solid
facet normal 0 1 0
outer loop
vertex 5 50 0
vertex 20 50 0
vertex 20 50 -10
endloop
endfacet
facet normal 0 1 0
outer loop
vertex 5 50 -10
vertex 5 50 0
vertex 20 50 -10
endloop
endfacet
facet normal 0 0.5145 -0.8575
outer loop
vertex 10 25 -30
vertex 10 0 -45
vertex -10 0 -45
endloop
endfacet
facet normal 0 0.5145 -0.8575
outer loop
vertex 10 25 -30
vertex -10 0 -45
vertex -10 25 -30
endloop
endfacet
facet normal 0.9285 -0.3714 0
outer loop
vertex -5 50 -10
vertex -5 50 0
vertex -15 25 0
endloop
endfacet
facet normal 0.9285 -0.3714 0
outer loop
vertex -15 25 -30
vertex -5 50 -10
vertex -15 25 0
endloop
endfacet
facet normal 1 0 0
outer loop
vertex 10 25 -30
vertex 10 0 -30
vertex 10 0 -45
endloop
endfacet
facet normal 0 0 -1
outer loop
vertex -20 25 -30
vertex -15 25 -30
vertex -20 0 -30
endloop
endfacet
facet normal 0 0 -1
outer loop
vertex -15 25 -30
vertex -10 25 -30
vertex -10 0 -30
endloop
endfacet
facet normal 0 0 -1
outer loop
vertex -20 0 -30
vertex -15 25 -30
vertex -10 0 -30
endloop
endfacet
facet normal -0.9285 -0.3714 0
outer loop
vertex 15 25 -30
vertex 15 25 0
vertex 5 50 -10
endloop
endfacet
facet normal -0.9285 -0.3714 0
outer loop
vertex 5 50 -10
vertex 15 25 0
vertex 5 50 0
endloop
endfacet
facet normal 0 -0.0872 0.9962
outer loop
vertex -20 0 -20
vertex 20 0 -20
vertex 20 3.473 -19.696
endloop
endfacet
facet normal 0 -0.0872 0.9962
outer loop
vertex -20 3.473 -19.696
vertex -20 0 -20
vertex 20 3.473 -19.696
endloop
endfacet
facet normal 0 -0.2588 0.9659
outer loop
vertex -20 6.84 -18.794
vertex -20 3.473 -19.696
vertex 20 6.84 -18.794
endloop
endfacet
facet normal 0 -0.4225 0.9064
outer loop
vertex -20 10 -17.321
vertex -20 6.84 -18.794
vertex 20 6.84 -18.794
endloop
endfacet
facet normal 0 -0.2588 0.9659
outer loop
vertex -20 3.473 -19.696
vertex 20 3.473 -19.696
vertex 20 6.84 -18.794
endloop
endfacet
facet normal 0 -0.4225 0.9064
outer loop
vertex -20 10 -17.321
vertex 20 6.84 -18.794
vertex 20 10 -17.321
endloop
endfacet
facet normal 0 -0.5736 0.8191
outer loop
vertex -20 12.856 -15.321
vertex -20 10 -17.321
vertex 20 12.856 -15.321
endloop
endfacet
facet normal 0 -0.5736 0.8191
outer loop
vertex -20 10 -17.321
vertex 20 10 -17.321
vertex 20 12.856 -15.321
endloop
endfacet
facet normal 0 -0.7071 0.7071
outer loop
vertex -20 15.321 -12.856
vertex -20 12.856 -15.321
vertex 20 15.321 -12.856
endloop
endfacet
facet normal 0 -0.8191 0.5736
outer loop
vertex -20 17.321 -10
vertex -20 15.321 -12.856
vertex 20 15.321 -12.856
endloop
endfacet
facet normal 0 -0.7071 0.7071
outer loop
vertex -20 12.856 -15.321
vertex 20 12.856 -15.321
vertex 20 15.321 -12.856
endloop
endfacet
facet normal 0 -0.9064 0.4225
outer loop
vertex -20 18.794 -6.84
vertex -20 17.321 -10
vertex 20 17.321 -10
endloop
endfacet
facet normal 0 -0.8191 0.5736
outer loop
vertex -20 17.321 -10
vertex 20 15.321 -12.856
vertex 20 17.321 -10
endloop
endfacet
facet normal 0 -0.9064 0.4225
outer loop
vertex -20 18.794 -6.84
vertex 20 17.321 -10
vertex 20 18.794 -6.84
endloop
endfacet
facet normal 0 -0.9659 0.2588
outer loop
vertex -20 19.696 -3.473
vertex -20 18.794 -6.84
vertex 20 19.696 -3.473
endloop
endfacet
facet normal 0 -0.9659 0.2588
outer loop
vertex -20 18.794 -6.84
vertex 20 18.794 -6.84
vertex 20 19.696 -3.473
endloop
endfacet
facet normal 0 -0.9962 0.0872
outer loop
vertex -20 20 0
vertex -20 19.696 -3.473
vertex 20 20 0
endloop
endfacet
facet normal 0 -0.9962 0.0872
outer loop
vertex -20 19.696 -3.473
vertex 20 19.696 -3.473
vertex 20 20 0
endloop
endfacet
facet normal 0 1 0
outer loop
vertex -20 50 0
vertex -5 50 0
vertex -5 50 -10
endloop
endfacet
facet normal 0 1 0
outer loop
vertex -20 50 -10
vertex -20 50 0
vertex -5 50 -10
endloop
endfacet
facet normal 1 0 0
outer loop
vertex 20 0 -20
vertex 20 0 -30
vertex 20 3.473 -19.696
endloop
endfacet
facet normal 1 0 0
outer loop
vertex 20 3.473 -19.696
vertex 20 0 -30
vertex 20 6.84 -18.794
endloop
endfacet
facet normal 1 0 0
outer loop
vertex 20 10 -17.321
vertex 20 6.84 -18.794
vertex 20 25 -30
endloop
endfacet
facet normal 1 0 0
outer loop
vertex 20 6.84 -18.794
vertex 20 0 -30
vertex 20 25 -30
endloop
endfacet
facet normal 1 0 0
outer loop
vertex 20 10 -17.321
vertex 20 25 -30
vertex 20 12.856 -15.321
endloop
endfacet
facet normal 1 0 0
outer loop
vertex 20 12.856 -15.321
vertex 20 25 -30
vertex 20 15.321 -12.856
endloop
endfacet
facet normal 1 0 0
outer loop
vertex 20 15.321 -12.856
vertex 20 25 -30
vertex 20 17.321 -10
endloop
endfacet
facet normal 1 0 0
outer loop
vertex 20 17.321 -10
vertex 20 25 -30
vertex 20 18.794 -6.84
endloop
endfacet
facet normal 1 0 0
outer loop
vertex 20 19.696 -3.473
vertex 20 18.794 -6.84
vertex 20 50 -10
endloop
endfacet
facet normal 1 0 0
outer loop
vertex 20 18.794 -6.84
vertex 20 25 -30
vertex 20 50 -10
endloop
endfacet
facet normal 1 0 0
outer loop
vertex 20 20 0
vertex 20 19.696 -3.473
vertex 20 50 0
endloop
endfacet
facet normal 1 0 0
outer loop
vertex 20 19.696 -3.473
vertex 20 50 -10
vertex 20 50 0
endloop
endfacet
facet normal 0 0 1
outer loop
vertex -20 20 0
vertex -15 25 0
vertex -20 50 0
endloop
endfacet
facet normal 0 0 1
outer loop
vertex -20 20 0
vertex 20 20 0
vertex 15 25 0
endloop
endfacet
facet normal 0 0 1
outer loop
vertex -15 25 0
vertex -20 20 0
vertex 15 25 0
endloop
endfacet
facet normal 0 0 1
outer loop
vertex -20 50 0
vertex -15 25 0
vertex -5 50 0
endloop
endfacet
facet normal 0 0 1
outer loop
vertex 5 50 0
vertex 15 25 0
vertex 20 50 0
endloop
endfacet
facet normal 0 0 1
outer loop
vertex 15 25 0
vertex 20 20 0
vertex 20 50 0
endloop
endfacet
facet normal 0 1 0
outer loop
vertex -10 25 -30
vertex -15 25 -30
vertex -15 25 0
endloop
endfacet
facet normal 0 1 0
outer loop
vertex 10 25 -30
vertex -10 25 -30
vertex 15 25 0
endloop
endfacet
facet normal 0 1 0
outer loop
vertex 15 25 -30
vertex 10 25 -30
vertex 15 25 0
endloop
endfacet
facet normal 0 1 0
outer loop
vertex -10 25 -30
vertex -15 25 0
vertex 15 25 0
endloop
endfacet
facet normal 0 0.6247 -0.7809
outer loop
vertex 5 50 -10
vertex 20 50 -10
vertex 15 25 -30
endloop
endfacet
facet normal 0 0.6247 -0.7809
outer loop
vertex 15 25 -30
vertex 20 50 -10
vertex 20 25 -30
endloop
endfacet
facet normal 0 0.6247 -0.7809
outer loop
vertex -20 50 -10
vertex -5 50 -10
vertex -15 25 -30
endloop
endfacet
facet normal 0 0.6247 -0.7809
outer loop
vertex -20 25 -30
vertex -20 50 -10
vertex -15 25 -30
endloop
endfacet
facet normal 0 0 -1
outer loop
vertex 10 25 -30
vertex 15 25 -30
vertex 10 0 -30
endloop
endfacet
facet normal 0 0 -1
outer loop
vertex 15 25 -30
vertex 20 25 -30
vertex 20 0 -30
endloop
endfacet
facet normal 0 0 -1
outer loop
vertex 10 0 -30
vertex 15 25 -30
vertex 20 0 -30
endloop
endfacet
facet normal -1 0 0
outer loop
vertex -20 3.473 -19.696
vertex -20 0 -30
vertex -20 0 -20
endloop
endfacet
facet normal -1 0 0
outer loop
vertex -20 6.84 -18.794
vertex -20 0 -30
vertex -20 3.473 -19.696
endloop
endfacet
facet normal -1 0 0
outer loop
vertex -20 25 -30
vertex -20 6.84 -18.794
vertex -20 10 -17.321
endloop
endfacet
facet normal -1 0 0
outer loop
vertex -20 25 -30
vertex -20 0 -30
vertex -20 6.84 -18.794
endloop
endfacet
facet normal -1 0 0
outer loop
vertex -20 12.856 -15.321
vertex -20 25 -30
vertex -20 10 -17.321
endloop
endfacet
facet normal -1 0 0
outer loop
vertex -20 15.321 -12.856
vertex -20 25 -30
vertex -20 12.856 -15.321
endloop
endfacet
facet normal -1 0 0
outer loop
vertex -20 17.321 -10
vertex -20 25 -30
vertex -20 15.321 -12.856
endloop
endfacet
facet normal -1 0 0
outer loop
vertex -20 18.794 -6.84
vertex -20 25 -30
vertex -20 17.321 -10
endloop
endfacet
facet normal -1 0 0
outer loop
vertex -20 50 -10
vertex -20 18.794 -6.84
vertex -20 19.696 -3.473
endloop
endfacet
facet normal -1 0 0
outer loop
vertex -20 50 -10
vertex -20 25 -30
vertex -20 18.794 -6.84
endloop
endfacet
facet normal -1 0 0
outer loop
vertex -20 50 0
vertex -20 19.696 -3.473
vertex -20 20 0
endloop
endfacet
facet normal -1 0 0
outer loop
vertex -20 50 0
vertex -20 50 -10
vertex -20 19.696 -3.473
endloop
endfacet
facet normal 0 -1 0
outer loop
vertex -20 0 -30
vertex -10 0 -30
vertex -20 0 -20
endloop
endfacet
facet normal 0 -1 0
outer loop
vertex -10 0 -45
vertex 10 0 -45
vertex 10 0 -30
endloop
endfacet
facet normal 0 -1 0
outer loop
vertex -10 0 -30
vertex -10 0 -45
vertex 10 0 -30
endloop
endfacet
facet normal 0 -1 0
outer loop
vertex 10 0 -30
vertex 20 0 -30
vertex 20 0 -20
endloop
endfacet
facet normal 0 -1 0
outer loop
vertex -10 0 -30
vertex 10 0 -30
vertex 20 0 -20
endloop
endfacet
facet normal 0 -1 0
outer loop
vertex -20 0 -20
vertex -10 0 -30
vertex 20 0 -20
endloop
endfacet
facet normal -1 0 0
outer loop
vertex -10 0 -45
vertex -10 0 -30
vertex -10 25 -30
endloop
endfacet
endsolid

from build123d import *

# Parameters (mm, degrees)
BOSS_EXTRUDE1_DEPTH = 20
BOSS_EXTRUDE2_DEPTH = 10
CUT_EXTRUDE1_DEPTH  = 71.178344238


with BuildPart() as part:
    # Sketch1 → Boss-Extrude1 (new, symmetric)
    with BuildSketch(Plane(origin=(0, 0, 0), x_dir=(0, 0, -1), z_dir=(1, 0, 0))):
        with BuildLine():
            Line((10, 50), (0, 50))
            Line((0, 50), (0, 20))
            ThreePointArc((0, 20), (14.142135624, 14.142135624), (20, 0))
            Line((20, 0), (30, 0))
            Line((30, 0), (30, 25))
            Line((30, 25), (10, 50))
        make_face()
    extrude(amount=BOSS_EXTRUDE1_DEPTH, both=True)

    # Sketch1<3> → Boss-Extrude2 (add, symmetric)
    with BuildSketch(Plane(origin=(0, 0, 0), x_dir=(0, 0, -1), z_dir=(1, 0, 0))):
        Polygon((45, 0), (30, 25), (30, 0), align=None)
    extrude(amount=BOSS_EXTRUDE2_DEPTH, both=True)

    # Sketch2 → Cut-Extrude1 (cut, through all)
    with BuildSketch(Plane.XY):
        Polygon((15, 25), (5, 50), (-5, 50), (-15, 25), align=None)
    extrude(amount=-CUT_EXTRUDE1_DEPTH, mode=Mode.SUBTRACT)


solid = part.part
